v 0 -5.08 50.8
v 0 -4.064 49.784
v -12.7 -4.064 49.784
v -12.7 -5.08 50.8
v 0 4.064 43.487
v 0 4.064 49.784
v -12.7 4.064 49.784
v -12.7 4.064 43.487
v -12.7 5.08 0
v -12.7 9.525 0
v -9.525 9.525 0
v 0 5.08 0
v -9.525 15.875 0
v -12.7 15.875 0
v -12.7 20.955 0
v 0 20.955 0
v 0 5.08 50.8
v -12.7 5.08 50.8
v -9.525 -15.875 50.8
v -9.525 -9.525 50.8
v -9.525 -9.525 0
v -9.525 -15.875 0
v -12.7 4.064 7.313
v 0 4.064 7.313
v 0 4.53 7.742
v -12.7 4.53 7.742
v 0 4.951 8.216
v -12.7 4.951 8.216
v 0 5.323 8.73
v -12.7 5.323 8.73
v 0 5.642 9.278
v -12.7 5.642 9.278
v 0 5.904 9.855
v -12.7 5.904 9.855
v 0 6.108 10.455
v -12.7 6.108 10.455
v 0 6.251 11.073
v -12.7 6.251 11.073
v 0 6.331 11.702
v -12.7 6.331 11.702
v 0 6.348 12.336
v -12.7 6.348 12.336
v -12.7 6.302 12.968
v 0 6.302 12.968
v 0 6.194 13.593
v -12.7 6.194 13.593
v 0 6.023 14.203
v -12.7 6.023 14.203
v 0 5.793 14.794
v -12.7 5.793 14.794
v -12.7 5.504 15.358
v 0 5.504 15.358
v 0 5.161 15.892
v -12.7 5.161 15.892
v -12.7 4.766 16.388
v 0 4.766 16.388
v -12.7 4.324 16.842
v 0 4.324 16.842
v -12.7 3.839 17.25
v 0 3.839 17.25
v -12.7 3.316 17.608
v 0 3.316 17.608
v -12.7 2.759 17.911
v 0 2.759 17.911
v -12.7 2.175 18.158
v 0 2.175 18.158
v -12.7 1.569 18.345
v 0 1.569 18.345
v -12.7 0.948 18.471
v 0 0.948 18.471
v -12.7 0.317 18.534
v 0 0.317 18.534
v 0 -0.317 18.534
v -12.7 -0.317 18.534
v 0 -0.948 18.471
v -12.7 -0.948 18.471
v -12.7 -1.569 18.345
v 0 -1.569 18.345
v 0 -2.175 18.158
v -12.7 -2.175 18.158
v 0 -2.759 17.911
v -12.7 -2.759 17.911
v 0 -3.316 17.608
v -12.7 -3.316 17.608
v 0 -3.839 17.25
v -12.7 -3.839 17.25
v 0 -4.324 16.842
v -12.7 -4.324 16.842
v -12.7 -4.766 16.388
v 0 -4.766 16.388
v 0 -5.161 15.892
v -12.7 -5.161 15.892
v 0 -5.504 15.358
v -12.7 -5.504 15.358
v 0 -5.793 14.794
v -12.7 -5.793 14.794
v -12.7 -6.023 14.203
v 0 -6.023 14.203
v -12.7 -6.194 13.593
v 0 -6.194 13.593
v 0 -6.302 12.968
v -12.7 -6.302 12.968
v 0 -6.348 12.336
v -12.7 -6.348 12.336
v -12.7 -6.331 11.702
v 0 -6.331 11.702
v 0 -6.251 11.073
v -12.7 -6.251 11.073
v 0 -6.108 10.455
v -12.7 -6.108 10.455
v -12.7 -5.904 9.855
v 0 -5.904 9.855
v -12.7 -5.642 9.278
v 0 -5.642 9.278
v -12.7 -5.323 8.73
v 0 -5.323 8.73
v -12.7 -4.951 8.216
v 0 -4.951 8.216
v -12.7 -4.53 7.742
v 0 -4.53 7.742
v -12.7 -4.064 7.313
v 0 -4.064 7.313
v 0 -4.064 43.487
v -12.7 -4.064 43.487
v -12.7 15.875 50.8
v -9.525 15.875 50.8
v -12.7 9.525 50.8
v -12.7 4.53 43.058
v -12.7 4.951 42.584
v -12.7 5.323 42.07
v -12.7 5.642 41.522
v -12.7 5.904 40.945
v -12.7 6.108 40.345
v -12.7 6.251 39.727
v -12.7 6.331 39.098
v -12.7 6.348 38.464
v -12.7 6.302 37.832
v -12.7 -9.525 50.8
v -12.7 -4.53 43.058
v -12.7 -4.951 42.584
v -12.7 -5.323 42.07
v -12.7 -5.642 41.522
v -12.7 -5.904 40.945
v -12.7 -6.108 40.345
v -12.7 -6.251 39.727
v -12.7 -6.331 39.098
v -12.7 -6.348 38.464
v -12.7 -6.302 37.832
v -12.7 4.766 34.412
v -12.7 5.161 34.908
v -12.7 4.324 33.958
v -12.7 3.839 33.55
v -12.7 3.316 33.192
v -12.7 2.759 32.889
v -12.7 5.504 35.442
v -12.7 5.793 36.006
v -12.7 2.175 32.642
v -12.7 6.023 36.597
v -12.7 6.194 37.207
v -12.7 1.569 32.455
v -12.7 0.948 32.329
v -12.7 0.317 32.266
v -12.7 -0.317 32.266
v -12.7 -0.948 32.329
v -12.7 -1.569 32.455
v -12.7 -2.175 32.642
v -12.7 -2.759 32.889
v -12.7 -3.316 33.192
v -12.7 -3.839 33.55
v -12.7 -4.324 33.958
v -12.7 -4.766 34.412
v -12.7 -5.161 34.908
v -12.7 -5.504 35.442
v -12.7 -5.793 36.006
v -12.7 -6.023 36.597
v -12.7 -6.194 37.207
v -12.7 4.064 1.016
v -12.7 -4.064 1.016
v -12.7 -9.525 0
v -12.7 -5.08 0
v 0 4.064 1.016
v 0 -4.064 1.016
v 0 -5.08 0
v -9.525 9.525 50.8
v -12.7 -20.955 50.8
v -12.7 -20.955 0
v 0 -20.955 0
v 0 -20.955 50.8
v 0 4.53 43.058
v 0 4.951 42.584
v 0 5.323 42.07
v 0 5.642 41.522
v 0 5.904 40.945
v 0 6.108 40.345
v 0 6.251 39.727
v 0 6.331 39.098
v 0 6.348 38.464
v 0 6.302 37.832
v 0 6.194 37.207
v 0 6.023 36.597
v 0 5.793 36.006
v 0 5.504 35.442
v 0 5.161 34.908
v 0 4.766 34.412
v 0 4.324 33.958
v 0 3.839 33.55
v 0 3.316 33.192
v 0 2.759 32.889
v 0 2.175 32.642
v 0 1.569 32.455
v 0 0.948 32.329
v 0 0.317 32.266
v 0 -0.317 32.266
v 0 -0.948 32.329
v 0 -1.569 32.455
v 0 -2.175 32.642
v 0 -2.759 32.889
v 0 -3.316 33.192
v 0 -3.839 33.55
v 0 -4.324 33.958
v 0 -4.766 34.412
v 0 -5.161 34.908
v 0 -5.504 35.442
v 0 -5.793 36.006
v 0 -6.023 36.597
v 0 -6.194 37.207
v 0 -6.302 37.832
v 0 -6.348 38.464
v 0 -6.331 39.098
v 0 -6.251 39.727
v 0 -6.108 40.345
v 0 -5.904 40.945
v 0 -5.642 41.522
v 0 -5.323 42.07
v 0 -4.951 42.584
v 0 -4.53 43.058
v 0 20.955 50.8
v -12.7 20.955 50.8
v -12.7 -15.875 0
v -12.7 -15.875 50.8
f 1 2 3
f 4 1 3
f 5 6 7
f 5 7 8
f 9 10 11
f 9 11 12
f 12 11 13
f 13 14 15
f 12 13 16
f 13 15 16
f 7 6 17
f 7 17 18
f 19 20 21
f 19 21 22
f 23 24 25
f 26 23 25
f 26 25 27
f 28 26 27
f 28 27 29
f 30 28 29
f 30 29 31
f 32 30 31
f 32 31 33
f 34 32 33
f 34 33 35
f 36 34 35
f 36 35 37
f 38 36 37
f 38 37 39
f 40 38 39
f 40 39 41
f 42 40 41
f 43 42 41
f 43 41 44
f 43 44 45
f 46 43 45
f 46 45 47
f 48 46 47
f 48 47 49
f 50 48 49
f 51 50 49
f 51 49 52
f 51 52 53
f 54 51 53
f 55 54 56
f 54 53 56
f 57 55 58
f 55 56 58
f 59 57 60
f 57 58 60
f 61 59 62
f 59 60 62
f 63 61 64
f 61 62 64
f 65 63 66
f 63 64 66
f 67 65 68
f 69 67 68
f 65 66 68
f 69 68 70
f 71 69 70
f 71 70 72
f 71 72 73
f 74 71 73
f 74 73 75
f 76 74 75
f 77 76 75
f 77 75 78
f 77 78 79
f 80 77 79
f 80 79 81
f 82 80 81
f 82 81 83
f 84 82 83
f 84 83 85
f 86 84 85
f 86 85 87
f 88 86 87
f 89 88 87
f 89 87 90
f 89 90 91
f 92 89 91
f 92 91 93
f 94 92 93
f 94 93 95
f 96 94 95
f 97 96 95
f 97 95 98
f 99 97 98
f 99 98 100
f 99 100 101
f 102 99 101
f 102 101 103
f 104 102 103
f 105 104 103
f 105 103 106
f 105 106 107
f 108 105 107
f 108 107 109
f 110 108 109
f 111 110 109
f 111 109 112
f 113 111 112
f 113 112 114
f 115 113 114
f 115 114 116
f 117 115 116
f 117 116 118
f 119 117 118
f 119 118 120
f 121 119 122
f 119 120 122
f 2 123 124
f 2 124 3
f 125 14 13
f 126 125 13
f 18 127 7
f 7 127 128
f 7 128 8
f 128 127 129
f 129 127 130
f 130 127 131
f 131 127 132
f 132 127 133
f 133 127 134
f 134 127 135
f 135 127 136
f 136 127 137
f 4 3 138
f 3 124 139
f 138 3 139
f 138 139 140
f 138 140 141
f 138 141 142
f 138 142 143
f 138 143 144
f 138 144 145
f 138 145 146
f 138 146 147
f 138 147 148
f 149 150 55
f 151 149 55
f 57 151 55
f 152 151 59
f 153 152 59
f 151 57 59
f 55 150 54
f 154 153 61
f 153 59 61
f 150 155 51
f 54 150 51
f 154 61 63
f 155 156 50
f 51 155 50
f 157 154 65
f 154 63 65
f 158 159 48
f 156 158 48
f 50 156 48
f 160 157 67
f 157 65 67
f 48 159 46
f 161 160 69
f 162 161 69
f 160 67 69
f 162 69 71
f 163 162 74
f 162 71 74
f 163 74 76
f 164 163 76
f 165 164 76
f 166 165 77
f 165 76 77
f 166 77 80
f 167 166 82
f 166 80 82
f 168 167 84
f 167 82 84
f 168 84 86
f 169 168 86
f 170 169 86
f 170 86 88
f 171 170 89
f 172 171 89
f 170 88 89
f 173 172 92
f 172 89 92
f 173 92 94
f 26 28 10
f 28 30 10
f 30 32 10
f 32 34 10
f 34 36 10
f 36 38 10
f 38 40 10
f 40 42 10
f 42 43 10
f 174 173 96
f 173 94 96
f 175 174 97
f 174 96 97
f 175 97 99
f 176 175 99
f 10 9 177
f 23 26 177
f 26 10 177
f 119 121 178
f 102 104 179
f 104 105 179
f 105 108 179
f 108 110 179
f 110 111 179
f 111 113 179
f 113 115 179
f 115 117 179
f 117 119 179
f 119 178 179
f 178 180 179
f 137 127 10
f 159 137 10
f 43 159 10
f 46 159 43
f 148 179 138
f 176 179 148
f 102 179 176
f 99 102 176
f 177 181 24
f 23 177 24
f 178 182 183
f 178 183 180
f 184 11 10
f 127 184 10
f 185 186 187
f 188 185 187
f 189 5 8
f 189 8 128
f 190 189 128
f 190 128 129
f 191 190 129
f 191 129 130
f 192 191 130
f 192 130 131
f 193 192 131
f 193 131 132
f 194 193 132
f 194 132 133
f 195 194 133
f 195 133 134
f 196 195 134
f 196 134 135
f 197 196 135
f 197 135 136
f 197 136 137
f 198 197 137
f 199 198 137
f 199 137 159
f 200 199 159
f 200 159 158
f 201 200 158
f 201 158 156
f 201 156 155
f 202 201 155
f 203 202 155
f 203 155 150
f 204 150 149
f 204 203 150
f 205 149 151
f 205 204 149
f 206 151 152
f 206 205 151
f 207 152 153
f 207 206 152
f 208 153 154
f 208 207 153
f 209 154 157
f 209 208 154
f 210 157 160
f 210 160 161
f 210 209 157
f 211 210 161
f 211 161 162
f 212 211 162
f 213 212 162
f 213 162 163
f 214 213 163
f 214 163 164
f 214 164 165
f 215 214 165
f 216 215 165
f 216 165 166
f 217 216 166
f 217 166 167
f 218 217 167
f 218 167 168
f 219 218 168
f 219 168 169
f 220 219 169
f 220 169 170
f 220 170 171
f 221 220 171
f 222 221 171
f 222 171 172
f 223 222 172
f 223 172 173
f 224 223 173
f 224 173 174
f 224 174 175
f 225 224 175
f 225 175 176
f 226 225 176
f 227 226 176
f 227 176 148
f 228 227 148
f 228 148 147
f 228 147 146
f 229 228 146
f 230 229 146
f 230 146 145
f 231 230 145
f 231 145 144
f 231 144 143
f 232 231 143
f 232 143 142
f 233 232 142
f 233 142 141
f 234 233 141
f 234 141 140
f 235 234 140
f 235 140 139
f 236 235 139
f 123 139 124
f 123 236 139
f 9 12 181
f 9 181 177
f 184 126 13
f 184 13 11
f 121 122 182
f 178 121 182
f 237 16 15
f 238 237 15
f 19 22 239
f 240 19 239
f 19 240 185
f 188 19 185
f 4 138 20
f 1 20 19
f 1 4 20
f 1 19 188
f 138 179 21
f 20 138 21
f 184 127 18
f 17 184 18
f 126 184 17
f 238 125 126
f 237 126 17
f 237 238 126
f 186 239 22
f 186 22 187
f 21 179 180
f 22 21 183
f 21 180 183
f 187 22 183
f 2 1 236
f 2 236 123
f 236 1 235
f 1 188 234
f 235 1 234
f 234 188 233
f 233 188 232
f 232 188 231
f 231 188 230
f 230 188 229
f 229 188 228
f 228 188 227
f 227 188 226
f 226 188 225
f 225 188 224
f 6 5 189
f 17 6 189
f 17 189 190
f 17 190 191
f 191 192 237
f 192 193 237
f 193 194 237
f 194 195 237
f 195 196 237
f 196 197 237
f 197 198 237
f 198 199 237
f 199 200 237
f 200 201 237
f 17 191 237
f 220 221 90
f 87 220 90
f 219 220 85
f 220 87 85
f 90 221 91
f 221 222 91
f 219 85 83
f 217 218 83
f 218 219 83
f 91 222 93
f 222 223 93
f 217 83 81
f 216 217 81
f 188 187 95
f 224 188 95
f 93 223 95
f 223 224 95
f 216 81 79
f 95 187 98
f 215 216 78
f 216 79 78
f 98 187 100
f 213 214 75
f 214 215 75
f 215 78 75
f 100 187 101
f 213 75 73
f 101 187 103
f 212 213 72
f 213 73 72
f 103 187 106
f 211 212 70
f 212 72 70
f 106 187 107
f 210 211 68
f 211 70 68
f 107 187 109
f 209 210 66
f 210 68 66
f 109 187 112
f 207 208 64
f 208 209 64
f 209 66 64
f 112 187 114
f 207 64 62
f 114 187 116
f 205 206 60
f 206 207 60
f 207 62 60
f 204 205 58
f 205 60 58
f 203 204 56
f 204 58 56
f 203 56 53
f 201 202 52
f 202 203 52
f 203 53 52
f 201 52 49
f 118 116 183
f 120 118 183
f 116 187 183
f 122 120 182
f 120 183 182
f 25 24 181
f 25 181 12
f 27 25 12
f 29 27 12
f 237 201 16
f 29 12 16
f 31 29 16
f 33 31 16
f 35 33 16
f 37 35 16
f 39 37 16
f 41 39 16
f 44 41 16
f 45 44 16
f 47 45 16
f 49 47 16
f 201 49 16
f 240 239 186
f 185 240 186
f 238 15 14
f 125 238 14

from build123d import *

# Parameters (mm, degrees)
F1_DEPTH = 50.8
F3_DEPTH = 25.4
F7_SIZE  = 1.016


with BuildPart() as f1:
    # F0 (on Top) → F1 (new body)
    with BuildSketch(Plane.XY):
        Polygon((-12.7, -15.875), (-12.7, -20.955), (0, -20.955), (0, 20.955), (-12.7, 20.955), (-12.7, 15.875), (-9.525, 15.875), (-9.525, 9.525), (-12.7, 9.525), (-12.7, -9.525), (-9.525, -9.525), (-9.525, -15.875), align=None)
    extrude(amount=F1_DEPTH)

    # F2 (on face) → F3 (cut)
    with BuildSketch(Plane.YZ):
        with BuildLine():
            Line((-4.064, 7.3128193311), (-4.064, 0))
            Line((-4.064, 0), (4.064, 0))
            Line((4.064, 0), (4.064, 7.3128193311))
            ThreePointArc((4.064, 7.3128193311), (0, 18.542), (-4.064, 7.3128193311))
        make_face()
    extrude(amount=-F3_DEPTH, mode=Mode.SUBTRACT)

    # F6: F1 across plane


with BuildPart() as f1_1:
    add(f1.part)
    add(f1.part.mirror(Plane(origin=(-5.8559647303, -12.4897385892, 25.4), x_dir=(1, 0, 0), z_dir=(0, 0, -1))), mode=Mode.INTERSECT)

    # F7
    f7_edges = [f1_1.edges().sort_by_distance(p)[0] for p in [
        (-6.35, -4.064, 50.8),
        (-6.35, 4.064, 50.8),
        (-6.35, 4.064, 0),
        (-6.35, -4.064, 0),
    ]]
    chamfer(f7_edges, length=F7_SIZE)


solid = f1_1.part
